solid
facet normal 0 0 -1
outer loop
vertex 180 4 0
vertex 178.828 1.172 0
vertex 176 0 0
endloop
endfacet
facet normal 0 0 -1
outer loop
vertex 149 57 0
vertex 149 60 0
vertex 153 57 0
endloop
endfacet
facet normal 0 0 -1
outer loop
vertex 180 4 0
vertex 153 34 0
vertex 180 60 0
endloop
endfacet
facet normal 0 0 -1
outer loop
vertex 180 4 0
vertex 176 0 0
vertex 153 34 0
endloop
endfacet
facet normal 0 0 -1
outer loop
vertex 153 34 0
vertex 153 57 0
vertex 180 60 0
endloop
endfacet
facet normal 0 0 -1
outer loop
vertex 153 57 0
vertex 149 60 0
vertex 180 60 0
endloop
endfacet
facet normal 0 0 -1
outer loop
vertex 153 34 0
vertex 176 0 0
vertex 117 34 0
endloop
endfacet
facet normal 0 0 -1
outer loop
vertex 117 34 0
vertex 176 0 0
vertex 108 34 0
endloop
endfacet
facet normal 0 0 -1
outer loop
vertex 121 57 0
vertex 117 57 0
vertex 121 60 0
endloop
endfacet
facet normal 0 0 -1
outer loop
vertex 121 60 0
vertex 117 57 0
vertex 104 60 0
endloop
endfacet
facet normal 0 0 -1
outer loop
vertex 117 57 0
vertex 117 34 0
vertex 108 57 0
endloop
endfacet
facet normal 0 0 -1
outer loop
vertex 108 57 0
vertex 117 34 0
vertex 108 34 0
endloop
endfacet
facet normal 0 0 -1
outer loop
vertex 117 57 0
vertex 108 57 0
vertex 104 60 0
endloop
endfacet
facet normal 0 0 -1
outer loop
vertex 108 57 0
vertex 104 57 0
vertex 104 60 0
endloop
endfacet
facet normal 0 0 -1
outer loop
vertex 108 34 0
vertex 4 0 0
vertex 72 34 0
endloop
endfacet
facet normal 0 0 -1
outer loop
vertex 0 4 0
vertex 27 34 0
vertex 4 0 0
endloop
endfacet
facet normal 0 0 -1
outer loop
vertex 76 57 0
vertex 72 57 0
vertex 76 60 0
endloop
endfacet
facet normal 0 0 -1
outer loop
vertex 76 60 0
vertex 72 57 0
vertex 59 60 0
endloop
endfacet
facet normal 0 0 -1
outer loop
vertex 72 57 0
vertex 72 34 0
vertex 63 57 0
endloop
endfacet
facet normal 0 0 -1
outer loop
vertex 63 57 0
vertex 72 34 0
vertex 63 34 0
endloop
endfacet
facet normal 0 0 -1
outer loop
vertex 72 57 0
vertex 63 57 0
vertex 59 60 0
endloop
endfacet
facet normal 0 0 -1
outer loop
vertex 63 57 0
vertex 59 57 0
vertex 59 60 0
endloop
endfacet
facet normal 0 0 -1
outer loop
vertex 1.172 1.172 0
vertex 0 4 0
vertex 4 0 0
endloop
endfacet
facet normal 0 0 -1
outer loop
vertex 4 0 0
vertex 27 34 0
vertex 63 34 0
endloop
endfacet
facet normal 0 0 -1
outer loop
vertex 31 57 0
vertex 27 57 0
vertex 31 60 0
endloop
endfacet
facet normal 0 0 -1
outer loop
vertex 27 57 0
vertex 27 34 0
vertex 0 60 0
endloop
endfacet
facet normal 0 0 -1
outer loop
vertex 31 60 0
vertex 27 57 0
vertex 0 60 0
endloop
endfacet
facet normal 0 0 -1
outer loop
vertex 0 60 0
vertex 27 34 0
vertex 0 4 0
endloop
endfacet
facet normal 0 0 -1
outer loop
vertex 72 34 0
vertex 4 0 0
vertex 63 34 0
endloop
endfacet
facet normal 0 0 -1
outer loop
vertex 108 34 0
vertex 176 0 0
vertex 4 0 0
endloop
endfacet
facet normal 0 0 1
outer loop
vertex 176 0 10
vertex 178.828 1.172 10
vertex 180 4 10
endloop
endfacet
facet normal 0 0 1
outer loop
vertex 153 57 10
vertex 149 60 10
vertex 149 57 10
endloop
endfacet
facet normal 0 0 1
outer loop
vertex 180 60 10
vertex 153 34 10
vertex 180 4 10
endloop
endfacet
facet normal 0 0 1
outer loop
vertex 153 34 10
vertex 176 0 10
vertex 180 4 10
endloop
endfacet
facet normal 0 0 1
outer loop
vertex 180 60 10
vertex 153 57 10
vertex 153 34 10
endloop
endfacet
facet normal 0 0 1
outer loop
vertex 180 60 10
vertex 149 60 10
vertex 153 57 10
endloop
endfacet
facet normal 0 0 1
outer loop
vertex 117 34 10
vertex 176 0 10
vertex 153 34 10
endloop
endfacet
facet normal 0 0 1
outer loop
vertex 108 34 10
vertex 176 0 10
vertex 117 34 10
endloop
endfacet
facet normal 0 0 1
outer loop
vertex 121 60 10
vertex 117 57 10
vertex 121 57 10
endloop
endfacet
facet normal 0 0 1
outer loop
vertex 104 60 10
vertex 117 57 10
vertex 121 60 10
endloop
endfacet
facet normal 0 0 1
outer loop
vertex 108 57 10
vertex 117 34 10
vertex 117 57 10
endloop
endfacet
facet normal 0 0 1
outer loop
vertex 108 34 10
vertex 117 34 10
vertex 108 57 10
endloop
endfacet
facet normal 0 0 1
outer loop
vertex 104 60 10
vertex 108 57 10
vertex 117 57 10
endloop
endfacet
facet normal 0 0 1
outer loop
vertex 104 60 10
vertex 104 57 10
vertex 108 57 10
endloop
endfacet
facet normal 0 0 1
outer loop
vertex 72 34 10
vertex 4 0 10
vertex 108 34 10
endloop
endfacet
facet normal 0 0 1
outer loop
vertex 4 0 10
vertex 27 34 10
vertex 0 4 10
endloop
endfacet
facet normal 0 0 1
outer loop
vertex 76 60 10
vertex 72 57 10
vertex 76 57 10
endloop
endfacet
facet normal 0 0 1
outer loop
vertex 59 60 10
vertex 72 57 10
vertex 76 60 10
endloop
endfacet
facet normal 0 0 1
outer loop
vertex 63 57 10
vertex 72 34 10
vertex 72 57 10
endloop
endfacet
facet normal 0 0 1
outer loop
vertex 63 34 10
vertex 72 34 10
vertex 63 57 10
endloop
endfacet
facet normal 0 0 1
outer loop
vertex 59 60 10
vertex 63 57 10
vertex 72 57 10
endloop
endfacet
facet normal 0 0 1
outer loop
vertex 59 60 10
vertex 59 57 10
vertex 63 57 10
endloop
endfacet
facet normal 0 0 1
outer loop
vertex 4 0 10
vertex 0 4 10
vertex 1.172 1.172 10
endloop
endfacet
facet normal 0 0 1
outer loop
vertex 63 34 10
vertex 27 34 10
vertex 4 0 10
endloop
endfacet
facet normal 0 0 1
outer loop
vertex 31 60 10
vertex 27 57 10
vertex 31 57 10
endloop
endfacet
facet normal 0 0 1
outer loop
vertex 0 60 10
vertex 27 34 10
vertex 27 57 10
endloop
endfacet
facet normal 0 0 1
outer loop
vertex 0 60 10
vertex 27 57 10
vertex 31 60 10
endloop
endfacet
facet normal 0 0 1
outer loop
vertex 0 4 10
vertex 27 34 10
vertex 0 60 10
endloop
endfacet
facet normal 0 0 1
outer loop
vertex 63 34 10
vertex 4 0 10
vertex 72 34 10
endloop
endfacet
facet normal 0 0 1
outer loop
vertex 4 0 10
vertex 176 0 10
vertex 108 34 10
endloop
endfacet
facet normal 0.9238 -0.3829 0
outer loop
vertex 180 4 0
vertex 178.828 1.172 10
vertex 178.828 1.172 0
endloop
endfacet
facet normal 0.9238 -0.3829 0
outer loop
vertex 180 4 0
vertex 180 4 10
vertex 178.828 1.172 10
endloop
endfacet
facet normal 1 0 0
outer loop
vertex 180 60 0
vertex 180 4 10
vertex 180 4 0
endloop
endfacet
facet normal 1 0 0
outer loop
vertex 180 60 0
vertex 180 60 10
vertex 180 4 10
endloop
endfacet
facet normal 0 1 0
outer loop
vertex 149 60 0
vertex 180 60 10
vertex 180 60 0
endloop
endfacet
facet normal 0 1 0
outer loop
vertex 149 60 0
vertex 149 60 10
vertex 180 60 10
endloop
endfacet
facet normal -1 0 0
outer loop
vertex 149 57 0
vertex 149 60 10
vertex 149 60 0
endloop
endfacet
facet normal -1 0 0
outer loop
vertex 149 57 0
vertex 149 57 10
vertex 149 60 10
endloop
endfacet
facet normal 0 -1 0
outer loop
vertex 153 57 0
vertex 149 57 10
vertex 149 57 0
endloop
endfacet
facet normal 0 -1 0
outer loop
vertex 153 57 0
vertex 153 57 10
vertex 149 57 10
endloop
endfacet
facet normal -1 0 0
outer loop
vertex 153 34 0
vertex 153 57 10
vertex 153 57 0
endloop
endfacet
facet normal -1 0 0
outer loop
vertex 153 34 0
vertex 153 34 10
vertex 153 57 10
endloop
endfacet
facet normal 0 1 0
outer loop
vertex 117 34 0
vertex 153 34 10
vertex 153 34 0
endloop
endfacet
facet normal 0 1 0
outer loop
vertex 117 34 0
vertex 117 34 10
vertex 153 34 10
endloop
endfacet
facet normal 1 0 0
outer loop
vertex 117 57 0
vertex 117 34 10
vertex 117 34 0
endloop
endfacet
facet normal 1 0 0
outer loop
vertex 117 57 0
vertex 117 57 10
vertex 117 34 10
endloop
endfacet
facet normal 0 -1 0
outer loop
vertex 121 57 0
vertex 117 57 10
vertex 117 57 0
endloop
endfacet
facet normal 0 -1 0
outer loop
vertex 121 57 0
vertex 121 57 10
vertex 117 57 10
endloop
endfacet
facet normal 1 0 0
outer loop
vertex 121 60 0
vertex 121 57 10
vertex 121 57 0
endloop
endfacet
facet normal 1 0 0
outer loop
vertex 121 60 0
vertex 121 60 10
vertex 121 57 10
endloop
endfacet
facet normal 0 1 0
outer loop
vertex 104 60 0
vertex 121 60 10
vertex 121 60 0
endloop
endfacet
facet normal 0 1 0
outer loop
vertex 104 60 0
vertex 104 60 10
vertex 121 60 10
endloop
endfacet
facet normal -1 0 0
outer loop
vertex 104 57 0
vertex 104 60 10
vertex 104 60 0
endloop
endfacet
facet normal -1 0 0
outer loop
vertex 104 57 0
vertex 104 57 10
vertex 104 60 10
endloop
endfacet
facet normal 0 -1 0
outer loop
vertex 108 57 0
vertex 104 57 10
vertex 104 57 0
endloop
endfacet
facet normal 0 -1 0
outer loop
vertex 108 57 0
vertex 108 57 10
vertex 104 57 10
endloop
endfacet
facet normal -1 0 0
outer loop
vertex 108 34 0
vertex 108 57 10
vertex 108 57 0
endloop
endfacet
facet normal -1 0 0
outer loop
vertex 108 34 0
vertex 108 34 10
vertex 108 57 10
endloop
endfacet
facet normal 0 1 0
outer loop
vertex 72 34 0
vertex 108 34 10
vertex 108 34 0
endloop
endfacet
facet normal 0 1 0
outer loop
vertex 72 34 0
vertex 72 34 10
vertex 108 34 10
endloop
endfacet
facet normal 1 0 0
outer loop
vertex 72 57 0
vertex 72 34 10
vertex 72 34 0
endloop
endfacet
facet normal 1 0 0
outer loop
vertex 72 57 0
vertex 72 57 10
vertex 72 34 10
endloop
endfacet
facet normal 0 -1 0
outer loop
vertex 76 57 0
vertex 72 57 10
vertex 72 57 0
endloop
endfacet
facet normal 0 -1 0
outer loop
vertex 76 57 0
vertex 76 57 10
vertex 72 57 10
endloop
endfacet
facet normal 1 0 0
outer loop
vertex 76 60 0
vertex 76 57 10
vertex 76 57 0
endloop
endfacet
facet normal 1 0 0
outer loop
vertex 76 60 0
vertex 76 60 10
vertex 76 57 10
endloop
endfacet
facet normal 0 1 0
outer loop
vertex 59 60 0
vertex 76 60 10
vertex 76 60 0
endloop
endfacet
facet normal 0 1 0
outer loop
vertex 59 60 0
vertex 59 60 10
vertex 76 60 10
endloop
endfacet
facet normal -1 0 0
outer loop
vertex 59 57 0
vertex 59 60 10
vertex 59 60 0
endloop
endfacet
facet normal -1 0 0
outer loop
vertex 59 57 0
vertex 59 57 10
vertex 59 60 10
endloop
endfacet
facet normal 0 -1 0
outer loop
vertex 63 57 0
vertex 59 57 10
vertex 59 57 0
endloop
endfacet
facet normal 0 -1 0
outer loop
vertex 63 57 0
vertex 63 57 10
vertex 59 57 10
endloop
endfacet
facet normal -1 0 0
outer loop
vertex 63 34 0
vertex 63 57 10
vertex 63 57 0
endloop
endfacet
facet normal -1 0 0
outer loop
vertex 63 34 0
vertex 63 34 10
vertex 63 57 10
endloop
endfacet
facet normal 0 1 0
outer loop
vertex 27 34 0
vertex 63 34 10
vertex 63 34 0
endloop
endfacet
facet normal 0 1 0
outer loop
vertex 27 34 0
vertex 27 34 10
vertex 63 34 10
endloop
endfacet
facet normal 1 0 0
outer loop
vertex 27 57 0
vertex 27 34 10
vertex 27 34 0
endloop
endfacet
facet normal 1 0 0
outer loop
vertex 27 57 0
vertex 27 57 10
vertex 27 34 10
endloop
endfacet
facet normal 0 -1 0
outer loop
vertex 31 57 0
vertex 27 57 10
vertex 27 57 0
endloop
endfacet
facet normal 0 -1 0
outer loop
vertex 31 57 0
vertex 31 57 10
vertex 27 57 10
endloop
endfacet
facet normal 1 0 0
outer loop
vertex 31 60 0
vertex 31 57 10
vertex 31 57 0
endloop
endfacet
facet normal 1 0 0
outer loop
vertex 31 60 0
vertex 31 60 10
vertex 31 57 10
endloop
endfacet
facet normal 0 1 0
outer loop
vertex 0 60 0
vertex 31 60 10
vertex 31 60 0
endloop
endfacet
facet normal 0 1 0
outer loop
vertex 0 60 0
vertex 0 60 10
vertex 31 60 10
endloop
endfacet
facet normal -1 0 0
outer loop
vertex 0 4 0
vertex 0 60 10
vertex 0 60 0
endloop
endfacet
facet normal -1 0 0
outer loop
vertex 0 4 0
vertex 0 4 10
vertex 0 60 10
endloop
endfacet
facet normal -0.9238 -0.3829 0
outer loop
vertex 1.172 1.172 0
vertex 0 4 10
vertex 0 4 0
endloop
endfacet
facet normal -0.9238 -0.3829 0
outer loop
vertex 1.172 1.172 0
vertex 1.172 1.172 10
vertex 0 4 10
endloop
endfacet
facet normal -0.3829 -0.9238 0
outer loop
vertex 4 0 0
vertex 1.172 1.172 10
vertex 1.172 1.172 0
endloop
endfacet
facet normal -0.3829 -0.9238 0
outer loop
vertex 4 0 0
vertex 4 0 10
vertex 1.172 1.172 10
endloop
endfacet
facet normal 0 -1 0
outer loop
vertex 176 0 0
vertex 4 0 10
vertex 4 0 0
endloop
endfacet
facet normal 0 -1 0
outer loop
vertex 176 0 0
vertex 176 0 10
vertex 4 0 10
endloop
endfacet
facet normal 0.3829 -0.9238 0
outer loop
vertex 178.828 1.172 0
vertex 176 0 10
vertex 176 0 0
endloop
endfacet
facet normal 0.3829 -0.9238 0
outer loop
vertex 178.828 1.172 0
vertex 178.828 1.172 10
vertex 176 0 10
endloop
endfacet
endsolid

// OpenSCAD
$fn = 32;

// ----------------------------------------------------------------------
// Oversize slot bar: 180 mm bar with 3 oversize windows
// ----------------------------------------------------------------------

// --- parameters (mm) ---
profile_height = 10;      // extrusion height
profile_points = 32;      // points of the closed outline

profile = [[0, 4], [1.172, 1.172], [4, 0], [176, 0], [178.828, 1.172], [180, 4], [180, 60], [149, 60], [149, 57], [153, 57], [153, 34], [117, 34], [117, 57], [121, 57], [121, 60], [104, 60], [104, 57], [108, 57], [108, 34], [72, 34], [72, 57], [76, 57], [76, 60], [59, 60], [59, 57], [63, 57], [63, 34], [27, 34], [27, 57], [31, 57], [31, 60], [0, 60]];  // single closed polygon, 32 points, counter clockwise

// --- the one profile operation ---
linear_extrude(height = profile_height) polygon(points = profile);
